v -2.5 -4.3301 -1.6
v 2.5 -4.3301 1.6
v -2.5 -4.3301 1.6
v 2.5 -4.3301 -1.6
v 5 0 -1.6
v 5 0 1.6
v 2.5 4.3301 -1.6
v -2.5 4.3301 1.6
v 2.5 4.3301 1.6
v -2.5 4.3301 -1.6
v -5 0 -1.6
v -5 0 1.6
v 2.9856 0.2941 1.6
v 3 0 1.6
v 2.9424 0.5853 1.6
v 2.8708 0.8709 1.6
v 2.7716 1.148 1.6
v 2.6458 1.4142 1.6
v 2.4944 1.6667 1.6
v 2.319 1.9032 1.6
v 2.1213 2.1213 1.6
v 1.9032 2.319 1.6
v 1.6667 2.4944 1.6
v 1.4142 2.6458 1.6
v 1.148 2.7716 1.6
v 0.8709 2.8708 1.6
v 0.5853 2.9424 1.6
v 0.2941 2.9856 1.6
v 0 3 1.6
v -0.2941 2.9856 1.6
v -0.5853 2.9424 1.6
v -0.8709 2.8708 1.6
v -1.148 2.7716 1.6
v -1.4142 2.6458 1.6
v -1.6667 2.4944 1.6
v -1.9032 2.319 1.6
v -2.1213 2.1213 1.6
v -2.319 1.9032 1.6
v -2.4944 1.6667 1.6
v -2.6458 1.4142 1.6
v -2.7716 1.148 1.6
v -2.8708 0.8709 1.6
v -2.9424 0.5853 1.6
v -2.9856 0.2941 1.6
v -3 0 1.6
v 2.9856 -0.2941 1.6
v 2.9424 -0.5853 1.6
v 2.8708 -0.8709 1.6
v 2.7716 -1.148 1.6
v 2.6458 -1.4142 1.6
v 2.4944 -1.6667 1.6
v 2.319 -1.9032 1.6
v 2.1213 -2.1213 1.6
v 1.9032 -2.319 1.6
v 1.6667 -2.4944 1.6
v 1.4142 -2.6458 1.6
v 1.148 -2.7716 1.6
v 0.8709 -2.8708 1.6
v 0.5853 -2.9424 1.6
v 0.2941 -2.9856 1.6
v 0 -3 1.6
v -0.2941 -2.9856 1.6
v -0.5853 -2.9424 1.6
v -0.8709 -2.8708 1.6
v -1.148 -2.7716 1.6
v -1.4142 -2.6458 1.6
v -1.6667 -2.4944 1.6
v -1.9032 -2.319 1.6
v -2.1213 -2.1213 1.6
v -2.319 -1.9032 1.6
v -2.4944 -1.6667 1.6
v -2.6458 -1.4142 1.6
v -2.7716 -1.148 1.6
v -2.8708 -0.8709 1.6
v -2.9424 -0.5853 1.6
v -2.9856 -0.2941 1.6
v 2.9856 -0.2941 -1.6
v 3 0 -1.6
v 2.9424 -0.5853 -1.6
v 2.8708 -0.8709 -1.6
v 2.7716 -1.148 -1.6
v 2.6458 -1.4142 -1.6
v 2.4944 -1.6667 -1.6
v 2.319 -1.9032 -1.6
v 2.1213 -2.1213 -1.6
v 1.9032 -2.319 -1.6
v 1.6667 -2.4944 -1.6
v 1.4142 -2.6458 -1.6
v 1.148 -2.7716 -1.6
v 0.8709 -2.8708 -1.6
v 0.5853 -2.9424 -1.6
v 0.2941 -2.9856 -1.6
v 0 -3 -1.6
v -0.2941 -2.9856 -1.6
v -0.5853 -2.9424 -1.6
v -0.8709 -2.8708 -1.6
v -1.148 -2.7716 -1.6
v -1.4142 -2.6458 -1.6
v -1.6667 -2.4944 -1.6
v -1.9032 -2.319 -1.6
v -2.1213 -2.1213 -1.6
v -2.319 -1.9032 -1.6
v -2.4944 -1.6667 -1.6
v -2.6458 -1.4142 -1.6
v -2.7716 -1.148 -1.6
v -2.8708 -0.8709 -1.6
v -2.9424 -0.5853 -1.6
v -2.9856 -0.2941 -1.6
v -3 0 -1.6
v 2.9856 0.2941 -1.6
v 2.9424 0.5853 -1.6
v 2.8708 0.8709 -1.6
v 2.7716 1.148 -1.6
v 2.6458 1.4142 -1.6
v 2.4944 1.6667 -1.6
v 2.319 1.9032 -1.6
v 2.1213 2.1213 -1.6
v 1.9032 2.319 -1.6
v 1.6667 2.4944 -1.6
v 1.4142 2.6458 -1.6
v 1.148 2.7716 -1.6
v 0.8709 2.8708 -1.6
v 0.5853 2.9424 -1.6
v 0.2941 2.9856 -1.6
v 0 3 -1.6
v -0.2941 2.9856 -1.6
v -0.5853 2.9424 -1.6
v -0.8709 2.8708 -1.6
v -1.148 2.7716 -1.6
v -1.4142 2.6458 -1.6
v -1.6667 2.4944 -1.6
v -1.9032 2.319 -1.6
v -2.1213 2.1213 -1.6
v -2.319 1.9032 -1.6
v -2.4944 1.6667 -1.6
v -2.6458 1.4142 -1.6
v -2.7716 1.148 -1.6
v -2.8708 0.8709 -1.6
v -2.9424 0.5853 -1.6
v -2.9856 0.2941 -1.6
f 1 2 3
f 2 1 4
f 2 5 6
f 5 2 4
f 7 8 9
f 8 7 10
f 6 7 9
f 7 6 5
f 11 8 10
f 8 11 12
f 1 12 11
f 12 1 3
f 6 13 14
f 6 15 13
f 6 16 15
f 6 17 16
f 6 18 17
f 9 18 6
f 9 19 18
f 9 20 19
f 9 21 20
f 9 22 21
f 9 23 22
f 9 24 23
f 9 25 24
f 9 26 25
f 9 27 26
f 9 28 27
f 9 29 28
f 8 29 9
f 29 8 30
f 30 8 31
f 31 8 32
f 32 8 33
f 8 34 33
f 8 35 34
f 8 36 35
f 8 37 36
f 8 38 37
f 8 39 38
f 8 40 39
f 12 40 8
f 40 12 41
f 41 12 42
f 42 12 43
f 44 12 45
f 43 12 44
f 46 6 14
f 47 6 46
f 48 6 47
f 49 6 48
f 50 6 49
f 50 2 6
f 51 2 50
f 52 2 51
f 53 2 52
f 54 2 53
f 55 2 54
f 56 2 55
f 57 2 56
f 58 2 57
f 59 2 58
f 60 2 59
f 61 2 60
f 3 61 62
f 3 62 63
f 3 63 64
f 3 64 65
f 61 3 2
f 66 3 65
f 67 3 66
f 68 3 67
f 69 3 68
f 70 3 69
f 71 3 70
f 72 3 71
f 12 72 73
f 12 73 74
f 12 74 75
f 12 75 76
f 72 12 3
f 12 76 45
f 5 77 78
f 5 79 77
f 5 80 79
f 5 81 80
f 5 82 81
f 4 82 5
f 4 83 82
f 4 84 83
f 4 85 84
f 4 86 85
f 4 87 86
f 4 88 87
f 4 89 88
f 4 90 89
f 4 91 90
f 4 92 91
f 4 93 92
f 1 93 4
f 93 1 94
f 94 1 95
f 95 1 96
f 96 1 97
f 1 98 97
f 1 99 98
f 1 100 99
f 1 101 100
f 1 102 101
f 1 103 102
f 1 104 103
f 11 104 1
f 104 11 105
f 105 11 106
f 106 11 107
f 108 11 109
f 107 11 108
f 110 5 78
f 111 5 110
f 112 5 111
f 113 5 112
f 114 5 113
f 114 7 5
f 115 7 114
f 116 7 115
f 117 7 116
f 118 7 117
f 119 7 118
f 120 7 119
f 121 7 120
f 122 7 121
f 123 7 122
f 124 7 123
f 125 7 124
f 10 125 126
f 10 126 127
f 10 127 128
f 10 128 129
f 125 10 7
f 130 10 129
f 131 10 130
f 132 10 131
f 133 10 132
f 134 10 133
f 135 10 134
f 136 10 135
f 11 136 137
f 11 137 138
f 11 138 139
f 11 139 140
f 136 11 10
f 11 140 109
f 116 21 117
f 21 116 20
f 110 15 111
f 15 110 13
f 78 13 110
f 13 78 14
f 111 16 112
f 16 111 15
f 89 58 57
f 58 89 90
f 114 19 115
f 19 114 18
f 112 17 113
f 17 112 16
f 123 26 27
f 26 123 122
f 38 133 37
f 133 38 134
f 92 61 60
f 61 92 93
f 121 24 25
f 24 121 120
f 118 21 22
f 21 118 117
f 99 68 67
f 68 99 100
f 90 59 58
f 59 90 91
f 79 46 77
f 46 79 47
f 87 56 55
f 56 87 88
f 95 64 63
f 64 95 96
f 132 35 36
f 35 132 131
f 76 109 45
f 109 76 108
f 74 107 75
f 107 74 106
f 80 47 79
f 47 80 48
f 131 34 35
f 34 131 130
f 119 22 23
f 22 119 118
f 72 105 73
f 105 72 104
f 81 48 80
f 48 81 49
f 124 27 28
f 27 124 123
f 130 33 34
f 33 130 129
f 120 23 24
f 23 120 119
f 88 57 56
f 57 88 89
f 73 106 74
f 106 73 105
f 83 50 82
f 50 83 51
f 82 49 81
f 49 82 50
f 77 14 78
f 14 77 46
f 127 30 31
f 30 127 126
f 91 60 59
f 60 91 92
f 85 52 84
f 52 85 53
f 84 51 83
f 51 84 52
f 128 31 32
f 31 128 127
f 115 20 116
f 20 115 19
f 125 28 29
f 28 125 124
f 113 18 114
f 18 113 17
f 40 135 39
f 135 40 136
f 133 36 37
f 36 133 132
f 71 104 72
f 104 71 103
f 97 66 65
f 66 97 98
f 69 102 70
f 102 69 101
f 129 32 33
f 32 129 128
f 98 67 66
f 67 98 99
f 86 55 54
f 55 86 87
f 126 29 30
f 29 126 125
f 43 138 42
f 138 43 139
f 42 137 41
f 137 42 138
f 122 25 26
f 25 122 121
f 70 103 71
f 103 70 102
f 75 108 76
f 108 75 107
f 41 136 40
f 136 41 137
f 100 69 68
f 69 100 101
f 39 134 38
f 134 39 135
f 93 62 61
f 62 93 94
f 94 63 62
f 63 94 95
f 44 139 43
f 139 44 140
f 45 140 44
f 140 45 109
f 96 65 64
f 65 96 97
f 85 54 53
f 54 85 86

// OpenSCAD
// Thin hex nut: 6.0mm through hole, 10.0mm across flats, 3.2mm thick

af = 10.0;          // across flats (mm)
thickness = 3.2;    // nut thickness (mm)
hole_d = 6.0;       // through hole diameter (mm)
clearance = 0.2;    // small clearance for boolean robustness (mm)

module hex_nut(af, thickness, hole_d) {
    difference() {
        // Outer hex prism (across flats controlled by r = af/2 with $fn=6)
        cylinder(h = thickness, r = af/2, $fn = 6, center = true);

        // Central through hole (slightly longer than thickness to guarantee cut-through)
        cylinder(h = thickness + 2*clearance, d = hole_d, center = true, $fn = 64);
    }
}

hex_nut(af, thickness, hole_d);
